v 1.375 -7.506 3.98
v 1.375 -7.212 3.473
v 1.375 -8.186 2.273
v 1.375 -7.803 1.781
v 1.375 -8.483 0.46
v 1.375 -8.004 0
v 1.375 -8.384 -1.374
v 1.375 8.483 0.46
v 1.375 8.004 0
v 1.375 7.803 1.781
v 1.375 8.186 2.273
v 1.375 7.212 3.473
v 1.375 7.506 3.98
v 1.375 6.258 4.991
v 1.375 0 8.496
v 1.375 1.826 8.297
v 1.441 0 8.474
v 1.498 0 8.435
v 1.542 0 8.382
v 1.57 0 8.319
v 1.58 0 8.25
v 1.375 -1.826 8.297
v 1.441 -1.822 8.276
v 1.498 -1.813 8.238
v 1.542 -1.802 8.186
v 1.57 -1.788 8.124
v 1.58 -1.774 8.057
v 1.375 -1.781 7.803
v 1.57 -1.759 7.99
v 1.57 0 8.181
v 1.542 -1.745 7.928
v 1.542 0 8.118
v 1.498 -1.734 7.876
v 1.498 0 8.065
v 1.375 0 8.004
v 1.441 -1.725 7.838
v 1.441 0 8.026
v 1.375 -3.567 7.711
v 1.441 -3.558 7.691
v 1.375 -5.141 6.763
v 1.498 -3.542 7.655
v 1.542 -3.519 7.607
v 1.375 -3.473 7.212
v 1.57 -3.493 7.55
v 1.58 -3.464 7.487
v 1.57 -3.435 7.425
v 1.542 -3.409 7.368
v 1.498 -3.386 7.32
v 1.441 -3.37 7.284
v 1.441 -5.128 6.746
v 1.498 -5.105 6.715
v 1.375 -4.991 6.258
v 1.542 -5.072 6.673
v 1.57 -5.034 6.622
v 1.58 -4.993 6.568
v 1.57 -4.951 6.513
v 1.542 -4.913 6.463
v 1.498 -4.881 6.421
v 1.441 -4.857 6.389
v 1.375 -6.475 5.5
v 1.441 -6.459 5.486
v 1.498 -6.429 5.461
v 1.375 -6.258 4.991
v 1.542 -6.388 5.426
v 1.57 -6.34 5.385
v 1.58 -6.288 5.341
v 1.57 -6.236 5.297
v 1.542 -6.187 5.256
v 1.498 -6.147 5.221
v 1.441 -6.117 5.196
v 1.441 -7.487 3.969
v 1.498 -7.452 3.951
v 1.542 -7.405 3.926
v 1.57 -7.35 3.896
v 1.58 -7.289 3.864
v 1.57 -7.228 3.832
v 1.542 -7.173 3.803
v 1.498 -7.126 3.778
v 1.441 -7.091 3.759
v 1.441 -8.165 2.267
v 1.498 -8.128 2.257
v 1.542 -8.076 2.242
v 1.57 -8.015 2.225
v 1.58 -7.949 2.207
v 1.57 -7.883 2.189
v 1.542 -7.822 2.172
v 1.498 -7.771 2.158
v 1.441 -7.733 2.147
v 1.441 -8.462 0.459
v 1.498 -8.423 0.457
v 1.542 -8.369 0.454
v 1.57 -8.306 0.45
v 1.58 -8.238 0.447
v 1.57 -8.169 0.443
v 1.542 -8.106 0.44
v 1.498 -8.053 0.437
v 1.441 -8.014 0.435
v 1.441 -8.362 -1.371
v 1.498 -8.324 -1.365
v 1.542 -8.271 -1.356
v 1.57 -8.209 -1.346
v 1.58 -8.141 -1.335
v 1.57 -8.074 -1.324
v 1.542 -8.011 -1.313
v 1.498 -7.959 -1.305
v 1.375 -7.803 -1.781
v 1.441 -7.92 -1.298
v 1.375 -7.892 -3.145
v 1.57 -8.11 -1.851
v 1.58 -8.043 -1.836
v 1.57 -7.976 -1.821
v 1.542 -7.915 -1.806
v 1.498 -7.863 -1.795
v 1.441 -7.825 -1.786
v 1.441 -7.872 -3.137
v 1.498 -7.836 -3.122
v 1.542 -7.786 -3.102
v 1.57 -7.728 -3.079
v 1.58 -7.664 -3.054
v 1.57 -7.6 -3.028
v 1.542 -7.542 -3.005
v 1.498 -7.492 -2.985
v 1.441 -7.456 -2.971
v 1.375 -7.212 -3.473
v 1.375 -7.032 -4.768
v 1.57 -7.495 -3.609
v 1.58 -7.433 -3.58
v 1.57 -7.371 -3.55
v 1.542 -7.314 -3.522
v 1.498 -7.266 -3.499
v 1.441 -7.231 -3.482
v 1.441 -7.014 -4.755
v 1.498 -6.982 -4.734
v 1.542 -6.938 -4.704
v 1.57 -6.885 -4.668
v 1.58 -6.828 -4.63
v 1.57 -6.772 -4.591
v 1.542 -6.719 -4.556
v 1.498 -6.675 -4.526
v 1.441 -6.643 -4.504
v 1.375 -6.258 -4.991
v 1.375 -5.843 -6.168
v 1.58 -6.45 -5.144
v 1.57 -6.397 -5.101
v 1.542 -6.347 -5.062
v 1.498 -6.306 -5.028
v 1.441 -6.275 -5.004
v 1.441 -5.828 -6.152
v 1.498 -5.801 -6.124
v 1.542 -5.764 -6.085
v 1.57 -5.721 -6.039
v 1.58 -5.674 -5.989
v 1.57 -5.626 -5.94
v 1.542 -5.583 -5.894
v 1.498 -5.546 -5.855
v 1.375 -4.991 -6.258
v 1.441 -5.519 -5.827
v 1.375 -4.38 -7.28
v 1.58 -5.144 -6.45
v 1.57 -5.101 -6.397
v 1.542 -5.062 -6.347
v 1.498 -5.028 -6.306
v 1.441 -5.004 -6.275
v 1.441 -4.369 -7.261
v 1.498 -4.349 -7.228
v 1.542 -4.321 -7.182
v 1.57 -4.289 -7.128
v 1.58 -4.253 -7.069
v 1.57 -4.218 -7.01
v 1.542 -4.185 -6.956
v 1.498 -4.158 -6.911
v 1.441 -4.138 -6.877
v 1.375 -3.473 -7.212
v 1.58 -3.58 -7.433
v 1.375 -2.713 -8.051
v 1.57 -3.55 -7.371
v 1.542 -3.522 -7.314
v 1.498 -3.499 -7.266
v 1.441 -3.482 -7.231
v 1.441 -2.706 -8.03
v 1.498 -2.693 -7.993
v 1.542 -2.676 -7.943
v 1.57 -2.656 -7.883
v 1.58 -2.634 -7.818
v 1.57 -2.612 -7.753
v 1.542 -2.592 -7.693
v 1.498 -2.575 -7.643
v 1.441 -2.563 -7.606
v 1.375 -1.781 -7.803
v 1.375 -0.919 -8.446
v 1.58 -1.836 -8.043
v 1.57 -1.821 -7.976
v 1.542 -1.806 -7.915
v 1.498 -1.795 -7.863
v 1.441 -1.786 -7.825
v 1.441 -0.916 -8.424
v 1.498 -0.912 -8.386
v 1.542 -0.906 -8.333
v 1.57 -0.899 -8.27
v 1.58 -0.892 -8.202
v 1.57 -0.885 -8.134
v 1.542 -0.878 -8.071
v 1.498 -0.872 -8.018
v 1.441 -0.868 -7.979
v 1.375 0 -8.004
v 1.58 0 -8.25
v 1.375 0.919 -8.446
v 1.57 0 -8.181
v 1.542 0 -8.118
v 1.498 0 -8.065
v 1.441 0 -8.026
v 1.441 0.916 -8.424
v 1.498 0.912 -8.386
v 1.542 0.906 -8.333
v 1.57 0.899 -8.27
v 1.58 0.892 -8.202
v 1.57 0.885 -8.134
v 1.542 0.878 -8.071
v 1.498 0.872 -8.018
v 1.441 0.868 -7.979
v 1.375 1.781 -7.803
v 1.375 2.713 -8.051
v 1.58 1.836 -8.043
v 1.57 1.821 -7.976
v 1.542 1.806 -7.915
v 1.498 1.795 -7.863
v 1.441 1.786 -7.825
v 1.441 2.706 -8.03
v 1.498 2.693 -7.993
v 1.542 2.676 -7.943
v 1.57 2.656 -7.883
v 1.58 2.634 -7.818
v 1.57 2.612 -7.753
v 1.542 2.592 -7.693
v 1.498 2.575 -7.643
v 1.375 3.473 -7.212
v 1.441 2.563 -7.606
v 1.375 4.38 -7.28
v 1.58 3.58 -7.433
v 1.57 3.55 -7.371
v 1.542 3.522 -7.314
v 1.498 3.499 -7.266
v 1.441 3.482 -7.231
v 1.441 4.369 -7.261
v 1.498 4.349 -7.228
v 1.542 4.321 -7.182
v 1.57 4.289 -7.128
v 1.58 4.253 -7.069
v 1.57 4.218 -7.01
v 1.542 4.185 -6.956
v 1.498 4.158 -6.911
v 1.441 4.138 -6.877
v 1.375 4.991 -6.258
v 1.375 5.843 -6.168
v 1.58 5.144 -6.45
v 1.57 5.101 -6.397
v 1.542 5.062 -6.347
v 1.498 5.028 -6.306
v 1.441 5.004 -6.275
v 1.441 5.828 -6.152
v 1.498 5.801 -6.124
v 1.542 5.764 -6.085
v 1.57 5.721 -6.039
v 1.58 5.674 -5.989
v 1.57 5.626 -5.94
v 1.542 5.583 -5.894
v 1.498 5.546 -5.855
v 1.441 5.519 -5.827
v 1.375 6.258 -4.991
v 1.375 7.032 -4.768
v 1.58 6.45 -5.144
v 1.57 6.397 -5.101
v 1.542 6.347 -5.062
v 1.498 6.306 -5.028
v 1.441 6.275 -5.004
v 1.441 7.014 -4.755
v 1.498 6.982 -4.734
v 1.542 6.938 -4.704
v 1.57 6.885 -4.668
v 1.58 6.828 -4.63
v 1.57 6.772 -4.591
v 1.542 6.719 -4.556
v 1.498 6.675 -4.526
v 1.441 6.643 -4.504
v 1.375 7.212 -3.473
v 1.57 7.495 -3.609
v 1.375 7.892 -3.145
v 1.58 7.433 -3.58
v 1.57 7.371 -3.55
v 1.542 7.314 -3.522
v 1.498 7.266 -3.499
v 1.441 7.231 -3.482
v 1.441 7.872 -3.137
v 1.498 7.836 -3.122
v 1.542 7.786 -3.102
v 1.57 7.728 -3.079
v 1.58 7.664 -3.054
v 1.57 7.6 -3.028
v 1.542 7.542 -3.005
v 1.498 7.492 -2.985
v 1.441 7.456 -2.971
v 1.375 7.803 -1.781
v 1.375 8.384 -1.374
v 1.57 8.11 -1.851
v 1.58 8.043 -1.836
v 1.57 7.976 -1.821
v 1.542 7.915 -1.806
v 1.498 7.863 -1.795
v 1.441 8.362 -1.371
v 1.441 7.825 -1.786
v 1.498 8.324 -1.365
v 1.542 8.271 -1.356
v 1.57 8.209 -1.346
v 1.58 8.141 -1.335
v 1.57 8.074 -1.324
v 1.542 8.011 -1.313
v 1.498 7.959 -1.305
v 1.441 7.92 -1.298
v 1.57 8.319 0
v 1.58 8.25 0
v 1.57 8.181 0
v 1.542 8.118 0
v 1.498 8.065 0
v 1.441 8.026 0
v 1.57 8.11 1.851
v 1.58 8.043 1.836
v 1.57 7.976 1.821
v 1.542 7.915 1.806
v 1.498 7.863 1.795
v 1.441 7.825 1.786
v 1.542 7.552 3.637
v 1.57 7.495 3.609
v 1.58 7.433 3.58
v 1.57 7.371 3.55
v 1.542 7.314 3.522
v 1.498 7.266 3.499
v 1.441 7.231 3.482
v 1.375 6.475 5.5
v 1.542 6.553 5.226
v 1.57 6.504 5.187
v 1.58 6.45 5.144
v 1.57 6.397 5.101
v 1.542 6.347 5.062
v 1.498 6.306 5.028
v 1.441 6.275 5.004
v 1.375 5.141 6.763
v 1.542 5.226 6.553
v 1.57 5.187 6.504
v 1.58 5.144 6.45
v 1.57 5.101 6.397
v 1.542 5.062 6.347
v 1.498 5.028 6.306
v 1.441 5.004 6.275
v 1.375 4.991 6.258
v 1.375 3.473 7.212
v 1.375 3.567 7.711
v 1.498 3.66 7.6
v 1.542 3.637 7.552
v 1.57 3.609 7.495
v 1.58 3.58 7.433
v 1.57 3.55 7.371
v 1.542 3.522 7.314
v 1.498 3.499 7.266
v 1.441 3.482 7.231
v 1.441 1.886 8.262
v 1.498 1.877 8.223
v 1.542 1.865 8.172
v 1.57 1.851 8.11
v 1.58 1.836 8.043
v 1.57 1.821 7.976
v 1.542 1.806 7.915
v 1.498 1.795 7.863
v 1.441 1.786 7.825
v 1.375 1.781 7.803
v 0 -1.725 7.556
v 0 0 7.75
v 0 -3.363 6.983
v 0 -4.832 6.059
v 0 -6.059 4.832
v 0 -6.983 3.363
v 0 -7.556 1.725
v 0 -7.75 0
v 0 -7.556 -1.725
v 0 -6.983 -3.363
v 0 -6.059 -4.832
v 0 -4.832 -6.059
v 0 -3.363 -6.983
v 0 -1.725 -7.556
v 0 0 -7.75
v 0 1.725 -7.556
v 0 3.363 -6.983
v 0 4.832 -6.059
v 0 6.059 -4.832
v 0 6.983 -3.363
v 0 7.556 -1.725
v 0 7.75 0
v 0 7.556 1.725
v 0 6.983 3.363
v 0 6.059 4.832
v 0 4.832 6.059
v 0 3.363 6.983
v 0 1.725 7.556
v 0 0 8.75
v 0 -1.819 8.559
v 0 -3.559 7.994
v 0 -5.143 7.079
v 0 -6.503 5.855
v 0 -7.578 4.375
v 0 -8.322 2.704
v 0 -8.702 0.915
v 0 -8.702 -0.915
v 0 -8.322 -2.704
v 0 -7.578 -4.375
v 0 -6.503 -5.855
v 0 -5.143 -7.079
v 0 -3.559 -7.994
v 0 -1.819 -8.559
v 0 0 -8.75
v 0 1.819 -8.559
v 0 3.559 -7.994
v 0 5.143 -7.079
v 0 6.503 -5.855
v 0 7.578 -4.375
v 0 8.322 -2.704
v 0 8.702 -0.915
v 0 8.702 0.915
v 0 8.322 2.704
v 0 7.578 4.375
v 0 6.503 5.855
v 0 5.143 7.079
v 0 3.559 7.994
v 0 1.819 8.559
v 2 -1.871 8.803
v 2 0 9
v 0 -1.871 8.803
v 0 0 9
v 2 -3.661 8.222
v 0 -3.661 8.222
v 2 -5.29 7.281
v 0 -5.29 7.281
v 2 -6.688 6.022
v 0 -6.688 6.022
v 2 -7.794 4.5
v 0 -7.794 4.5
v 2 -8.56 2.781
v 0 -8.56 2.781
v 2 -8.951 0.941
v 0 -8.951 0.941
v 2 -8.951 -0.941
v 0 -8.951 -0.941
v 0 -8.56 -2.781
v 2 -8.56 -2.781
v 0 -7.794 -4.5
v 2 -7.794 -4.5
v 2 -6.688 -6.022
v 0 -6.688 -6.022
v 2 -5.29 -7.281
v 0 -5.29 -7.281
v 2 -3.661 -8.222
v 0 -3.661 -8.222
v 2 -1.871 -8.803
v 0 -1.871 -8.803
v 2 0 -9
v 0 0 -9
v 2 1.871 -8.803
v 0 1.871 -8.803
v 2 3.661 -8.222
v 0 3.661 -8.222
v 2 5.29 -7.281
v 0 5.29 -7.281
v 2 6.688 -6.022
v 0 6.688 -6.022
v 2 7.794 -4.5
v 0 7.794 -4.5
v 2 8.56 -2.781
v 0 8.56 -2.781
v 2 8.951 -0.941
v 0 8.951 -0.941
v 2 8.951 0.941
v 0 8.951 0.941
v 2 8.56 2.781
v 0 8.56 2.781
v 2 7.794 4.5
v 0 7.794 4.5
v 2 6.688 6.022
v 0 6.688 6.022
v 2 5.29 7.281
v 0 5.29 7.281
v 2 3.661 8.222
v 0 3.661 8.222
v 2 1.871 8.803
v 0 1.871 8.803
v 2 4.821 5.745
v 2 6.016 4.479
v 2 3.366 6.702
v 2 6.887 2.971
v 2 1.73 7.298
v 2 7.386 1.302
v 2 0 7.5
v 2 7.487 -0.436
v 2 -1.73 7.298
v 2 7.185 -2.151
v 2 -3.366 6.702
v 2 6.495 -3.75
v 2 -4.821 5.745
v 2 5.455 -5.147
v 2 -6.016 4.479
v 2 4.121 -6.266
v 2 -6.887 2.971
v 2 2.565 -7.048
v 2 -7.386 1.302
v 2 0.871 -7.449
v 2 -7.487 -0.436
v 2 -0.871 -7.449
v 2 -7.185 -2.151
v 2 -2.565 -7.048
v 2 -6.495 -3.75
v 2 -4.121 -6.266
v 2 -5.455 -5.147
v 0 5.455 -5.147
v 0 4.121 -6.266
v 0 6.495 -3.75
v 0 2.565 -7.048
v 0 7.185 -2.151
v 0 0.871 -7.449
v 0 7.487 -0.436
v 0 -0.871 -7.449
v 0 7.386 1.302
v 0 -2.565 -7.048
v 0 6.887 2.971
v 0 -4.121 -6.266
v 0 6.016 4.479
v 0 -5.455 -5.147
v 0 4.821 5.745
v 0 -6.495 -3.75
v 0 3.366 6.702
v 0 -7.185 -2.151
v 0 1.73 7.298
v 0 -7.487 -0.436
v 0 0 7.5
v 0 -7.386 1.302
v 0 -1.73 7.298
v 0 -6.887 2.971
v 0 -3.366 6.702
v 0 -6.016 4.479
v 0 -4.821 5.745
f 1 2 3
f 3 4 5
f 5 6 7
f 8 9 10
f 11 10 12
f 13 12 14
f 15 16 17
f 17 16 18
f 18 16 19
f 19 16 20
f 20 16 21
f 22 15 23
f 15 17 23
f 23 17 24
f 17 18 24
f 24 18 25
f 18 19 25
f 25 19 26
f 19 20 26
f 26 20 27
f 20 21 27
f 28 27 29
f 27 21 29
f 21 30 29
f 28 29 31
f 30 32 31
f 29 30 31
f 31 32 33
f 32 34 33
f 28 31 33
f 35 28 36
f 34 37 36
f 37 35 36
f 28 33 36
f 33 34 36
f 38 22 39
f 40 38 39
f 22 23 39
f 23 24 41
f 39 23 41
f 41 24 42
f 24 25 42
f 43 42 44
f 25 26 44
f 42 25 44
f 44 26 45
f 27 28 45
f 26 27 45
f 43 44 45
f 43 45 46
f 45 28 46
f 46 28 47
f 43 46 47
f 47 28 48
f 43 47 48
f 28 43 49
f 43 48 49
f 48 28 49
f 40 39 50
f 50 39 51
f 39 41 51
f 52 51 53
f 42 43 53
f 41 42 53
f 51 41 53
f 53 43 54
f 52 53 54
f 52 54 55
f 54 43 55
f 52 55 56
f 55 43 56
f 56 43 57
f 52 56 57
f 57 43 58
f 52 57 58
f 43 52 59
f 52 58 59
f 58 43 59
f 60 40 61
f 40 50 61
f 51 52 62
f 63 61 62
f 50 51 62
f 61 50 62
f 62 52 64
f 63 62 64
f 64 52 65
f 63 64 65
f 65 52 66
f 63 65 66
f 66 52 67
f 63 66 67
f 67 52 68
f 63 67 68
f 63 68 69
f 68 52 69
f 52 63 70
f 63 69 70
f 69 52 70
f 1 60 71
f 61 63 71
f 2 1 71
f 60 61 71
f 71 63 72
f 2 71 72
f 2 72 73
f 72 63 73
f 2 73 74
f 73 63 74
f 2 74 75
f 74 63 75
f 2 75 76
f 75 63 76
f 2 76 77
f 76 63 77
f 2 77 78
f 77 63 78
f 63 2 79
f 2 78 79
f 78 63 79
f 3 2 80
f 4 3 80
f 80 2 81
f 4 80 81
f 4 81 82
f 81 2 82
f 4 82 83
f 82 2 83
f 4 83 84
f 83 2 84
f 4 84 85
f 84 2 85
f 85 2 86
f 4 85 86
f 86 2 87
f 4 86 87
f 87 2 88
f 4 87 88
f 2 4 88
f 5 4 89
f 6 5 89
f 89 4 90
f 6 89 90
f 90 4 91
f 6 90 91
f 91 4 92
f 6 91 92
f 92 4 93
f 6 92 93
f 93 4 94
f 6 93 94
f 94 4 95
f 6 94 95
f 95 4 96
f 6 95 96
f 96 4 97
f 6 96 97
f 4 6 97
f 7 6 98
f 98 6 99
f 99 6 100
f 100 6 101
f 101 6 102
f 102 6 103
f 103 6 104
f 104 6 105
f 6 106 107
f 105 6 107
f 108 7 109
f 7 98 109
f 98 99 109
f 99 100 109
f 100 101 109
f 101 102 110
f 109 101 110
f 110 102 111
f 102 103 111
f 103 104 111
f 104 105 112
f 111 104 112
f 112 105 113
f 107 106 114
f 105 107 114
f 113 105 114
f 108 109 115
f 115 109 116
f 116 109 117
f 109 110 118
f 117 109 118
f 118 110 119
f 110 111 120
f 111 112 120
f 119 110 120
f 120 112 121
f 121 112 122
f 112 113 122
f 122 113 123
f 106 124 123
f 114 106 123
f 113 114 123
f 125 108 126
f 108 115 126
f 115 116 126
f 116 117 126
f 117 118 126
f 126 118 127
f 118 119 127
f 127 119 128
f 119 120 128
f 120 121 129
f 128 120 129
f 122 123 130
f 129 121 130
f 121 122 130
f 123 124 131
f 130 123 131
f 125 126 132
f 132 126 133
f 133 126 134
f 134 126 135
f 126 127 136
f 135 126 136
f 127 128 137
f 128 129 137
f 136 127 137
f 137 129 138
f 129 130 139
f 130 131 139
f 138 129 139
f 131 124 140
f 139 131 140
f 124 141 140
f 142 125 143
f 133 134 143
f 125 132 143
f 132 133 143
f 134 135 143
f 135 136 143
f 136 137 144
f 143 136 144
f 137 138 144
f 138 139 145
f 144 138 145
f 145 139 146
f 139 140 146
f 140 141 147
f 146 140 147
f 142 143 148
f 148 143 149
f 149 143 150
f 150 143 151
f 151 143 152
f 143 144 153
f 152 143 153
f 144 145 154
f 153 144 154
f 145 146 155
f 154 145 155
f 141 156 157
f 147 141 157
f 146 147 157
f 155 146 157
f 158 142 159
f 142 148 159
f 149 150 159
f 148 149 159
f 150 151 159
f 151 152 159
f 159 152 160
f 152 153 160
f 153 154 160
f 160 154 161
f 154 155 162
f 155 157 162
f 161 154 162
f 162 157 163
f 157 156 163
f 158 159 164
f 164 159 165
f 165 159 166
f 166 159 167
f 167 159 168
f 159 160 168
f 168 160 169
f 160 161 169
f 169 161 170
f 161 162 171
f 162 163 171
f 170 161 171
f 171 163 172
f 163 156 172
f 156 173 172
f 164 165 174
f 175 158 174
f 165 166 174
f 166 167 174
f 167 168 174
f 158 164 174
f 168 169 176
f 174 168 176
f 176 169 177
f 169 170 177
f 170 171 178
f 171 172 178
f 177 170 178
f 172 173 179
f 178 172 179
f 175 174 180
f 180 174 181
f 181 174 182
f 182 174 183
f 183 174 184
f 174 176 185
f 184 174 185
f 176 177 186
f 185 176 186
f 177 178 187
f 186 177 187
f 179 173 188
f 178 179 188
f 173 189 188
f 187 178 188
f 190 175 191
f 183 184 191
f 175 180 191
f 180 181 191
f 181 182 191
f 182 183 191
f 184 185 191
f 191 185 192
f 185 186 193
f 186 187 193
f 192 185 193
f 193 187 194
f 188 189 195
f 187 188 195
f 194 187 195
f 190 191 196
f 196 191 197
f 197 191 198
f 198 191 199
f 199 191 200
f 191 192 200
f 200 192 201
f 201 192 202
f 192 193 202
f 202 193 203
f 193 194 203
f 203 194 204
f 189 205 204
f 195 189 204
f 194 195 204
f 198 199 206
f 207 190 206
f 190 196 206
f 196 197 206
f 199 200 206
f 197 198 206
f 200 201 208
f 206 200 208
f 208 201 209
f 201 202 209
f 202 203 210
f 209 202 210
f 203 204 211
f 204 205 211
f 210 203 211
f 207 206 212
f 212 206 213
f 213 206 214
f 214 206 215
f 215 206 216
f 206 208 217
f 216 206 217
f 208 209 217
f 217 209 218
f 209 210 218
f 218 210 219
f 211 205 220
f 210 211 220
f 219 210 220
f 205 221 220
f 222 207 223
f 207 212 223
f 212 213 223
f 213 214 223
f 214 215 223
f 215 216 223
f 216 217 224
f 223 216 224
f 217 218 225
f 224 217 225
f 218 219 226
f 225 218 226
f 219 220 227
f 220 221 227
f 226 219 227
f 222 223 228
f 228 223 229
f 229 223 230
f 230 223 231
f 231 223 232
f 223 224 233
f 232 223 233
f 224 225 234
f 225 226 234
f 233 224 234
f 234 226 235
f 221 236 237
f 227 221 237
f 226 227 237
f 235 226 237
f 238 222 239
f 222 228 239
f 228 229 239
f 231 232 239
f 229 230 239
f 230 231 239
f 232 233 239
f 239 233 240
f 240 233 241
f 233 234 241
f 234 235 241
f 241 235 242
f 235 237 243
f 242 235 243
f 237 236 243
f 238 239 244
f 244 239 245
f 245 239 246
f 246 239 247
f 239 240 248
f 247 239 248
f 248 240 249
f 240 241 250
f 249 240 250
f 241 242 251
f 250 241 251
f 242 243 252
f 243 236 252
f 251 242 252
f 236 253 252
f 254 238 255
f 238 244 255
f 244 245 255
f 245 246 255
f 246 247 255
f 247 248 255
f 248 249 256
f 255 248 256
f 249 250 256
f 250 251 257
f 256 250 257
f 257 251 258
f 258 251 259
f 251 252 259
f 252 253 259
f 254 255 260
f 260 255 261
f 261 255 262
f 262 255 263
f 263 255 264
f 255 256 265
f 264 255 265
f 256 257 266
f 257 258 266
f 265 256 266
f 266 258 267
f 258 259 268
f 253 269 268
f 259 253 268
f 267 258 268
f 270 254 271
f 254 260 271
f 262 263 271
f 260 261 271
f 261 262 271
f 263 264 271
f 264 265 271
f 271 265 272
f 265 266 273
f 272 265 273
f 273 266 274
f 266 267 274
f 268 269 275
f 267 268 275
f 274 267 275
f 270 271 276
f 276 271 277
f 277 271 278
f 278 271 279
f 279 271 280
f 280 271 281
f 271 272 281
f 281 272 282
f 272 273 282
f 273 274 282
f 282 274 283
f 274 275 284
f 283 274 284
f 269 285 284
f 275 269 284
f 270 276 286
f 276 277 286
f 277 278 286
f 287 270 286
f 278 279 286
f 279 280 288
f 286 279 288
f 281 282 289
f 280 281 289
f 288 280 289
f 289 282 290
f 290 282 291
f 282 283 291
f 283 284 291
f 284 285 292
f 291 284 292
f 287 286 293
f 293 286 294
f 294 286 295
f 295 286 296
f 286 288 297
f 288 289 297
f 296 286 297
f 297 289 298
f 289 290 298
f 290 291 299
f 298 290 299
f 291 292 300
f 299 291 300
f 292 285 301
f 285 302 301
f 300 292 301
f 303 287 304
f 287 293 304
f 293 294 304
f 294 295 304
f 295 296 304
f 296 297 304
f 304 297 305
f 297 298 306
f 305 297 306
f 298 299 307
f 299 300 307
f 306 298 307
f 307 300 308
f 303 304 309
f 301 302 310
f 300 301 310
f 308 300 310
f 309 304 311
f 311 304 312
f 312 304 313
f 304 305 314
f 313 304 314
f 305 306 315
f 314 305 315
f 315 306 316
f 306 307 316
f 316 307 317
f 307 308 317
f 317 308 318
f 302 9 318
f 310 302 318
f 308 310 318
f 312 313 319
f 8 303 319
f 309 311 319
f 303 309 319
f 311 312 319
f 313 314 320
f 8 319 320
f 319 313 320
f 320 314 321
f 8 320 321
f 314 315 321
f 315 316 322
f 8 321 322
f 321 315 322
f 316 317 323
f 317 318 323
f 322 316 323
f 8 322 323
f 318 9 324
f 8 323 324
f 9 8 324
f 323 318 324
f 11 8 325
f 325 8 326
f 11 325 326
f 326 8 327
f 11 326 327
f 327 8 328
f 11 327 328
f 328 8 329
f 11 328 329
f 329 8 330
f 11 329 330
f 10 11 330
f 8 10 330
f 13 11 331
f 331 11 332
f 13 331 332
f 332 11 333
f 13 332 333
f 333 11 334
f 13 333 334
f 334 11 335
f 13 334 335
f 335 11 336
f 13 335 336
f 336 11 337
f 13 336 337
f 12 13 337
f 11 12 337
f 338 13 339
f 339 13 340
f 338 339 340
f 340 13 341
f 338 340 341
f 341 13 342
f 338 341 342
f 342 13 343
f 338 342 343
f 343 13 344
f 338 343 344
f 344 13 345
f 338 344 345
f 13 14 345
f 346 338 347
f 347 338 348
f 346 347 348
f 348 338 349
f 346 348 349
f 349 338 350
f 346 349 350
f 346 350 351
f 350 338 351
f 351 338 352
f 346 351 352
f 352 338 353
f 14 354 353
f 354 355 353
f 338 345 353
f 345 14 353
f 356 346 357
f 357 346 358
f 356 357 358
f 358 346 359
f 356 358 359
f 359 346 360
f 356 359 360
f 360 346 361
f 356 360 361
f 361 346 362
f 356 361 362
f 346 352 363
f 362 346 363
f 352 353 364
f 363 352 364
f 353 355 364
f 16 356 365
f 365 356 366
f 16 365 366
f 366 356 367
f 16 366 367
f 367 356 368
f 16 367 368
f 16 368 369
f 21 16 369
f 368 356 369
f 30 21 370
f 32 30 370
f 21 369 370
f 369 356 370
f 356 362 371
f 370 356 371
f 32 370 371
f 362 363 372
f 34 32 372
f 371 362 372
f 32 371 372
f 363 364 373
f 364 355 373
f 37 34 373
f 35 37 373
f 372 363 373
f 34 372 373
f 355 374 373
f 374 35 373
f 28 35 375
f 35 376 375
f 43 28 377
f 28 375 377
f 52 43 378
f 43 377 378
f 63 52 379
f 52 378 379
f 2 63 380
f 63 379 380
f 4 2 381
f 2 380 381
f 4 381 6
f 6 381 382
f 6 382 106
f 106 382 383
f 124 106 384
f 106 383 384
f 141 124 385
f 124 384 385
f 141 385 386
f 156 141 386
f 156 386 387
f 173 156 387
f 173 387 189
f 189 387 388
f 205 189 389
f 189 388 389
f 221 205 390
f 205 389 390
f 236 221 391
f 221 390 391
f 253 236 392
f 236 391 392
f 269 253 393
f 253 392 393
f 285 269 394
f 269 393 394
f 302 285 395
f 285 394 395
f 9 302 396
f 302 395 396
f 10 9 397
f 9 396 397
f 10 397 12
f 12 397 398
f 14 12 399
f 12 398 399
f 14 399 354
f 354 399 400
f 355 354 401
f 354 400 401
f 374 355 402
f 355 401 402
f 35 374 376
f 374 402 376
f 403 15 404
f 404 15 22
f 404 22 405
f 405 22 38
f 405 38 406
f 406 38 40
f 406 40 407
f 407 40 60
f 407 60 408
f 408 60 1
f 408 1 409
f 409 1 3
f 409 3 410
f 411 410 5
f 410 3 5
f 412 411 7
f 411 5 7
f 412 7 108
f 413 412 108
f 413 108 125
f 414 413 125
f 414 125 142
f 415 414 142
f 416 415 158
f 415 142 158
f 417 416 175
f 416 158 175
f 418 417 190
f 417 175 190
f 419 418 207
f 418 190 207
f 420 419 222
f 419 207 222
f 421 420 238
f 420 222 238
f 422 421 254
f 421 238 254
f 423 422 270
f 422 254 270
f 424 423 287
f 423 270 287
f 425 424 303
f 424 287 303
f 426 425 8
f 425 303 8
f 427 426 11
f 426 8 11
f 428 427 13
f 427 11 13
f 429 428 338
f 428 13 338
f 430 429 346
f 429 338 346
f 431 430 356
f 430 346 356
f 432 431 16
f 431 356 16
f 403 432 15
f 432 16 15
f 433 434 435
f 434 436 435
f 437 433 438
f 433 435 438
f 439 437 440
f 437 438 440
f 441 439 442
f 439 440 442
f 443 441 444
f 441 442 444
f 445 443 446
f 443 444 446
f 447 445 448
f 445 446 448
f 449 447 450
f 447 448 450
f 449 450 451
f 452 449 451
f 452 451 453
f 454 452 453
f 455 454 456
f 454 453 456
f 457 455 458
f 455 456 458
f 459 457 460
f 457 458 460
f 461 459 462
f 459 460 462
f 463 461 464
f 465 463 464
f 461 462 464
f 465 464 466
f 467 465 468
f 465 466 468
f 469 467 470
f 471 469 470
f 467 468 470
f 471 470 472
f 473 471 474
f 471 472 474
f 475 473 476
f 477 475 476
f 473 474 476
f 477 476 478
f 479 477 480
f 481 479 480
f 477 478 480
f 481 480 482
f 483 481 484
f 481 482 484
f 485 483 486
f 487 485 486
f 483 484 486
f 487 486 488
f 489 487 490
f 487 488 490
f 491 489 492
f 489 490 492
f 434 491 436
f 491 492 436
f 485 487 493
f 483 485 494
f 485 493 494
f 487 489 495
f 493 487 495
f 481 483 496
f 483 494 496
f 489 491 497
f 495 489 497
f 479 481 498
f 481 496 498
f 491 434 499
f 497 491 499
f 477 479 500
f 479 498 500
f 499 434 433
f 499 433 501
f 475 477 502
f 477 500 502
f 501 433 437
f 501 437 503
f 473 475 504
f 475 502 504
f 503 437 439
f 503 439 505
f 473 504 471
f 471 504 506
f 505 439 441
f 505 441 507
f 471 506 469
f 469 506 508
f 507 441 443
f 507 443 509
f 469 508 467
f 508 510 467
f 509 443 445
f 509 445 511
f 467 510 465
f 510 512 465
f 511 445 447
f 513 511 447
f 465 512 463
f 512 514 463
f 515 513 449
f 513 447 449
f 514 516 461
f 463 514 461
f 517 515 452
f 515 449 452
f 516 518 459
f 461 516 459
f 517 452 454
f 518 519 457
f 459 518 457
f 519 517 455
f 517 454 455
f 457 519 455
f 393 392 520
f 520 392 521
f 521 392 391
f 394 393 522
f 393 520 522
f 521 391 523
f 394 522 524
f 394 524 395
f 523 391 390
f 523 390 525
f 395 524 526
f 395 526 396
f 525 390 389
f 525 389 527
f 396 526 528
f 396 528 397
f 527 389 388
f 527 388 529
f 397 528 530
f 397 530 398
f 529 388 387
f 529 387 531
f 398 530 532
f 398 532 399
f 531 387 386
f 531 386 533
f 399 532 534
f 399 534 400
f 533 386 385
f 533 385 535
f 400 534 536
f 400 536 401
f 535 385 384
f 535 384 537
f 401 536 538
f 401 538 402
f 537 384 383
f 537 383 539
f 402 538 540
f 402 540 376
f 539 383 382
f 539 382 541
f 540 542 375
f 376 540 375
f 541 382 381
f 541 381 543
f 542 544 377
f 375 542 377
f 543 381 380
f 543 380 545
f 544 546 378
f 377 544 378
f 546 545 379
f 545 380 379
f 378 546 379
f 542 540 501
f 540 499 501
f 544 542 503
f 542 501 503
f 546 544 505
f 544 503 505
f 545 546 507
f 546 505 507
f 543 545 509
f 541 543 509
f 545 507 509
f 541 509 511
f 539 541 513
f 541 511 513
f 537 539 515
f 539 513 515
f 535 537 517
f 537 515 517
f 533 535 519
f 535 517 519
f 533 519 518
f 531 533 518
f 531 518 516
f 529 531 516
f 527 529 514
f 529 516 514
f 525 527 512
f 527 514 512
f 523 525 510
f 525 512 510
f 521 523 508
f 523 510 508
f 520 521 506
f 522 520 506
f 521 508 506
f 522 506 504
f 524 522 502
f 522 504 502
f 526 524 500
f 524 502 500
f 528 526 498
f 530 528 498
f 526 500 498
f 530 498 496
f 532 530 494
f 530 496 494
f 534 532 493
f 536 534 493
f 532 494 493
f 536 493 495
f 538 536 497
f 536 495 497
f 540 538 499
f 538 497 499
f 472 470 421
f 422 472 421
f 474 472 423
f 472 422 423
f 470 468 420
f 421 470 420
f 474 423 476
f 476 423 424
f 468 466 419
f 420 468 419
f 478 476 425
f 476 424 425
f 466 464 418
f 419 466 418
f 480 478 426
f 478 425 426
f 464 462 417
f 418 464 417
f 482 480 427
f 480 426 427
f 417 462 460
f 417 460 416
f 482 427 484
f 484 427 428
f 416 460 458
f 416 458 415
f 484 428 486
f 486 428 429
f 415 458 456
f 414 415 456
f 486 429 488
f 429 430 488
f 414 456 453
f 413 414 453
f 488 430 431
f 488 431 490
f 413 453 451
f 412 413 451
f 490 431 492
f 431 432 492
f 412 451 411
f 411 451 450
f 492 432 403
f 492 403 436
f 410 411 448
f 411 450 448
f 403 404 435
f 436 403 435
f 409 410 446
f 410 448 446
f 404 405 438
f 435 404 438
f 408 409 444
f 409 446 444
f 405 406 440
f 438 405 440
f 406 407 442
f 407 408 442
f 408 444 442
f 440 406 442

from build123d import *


with BuildPart() as part:
    # Croquis1 → Revolución1 (revolve)
    with BuildSketch(Plane(origin=(0, 0, 0), x_dir=(1, 0, 0), z_dir=(0, 1, 0)), mode=Mode.PRIVATE) as revoluci_n1_sk:
        with BuildLine():
            Line((0, 7.5), (2, 7.5))
            Line((2, 7.5), (2, 9))
            Line((2, 9), (0, 9))
            Line((0, 9), (0, 8.75))
            Line((0, 8.75), (1.375452526, 8.495838133))
            ThreePointArc((1.375452526, 8.495838133), (1.580025529, 8.25), (1.375452526, 8.004161867))
            Line((1.375452526, 8.004161867), (0, 7.75))
            Line((0, 7.75), (0, 7.5))
        make_face()
    revolve(revoluci_n1_sk.sketch.rotate(Axis((0, 0, 0), (1, 0, 0)), 180), axis=Axis((0, 0, 0), (1, 0, 0)))


solid = part.part
